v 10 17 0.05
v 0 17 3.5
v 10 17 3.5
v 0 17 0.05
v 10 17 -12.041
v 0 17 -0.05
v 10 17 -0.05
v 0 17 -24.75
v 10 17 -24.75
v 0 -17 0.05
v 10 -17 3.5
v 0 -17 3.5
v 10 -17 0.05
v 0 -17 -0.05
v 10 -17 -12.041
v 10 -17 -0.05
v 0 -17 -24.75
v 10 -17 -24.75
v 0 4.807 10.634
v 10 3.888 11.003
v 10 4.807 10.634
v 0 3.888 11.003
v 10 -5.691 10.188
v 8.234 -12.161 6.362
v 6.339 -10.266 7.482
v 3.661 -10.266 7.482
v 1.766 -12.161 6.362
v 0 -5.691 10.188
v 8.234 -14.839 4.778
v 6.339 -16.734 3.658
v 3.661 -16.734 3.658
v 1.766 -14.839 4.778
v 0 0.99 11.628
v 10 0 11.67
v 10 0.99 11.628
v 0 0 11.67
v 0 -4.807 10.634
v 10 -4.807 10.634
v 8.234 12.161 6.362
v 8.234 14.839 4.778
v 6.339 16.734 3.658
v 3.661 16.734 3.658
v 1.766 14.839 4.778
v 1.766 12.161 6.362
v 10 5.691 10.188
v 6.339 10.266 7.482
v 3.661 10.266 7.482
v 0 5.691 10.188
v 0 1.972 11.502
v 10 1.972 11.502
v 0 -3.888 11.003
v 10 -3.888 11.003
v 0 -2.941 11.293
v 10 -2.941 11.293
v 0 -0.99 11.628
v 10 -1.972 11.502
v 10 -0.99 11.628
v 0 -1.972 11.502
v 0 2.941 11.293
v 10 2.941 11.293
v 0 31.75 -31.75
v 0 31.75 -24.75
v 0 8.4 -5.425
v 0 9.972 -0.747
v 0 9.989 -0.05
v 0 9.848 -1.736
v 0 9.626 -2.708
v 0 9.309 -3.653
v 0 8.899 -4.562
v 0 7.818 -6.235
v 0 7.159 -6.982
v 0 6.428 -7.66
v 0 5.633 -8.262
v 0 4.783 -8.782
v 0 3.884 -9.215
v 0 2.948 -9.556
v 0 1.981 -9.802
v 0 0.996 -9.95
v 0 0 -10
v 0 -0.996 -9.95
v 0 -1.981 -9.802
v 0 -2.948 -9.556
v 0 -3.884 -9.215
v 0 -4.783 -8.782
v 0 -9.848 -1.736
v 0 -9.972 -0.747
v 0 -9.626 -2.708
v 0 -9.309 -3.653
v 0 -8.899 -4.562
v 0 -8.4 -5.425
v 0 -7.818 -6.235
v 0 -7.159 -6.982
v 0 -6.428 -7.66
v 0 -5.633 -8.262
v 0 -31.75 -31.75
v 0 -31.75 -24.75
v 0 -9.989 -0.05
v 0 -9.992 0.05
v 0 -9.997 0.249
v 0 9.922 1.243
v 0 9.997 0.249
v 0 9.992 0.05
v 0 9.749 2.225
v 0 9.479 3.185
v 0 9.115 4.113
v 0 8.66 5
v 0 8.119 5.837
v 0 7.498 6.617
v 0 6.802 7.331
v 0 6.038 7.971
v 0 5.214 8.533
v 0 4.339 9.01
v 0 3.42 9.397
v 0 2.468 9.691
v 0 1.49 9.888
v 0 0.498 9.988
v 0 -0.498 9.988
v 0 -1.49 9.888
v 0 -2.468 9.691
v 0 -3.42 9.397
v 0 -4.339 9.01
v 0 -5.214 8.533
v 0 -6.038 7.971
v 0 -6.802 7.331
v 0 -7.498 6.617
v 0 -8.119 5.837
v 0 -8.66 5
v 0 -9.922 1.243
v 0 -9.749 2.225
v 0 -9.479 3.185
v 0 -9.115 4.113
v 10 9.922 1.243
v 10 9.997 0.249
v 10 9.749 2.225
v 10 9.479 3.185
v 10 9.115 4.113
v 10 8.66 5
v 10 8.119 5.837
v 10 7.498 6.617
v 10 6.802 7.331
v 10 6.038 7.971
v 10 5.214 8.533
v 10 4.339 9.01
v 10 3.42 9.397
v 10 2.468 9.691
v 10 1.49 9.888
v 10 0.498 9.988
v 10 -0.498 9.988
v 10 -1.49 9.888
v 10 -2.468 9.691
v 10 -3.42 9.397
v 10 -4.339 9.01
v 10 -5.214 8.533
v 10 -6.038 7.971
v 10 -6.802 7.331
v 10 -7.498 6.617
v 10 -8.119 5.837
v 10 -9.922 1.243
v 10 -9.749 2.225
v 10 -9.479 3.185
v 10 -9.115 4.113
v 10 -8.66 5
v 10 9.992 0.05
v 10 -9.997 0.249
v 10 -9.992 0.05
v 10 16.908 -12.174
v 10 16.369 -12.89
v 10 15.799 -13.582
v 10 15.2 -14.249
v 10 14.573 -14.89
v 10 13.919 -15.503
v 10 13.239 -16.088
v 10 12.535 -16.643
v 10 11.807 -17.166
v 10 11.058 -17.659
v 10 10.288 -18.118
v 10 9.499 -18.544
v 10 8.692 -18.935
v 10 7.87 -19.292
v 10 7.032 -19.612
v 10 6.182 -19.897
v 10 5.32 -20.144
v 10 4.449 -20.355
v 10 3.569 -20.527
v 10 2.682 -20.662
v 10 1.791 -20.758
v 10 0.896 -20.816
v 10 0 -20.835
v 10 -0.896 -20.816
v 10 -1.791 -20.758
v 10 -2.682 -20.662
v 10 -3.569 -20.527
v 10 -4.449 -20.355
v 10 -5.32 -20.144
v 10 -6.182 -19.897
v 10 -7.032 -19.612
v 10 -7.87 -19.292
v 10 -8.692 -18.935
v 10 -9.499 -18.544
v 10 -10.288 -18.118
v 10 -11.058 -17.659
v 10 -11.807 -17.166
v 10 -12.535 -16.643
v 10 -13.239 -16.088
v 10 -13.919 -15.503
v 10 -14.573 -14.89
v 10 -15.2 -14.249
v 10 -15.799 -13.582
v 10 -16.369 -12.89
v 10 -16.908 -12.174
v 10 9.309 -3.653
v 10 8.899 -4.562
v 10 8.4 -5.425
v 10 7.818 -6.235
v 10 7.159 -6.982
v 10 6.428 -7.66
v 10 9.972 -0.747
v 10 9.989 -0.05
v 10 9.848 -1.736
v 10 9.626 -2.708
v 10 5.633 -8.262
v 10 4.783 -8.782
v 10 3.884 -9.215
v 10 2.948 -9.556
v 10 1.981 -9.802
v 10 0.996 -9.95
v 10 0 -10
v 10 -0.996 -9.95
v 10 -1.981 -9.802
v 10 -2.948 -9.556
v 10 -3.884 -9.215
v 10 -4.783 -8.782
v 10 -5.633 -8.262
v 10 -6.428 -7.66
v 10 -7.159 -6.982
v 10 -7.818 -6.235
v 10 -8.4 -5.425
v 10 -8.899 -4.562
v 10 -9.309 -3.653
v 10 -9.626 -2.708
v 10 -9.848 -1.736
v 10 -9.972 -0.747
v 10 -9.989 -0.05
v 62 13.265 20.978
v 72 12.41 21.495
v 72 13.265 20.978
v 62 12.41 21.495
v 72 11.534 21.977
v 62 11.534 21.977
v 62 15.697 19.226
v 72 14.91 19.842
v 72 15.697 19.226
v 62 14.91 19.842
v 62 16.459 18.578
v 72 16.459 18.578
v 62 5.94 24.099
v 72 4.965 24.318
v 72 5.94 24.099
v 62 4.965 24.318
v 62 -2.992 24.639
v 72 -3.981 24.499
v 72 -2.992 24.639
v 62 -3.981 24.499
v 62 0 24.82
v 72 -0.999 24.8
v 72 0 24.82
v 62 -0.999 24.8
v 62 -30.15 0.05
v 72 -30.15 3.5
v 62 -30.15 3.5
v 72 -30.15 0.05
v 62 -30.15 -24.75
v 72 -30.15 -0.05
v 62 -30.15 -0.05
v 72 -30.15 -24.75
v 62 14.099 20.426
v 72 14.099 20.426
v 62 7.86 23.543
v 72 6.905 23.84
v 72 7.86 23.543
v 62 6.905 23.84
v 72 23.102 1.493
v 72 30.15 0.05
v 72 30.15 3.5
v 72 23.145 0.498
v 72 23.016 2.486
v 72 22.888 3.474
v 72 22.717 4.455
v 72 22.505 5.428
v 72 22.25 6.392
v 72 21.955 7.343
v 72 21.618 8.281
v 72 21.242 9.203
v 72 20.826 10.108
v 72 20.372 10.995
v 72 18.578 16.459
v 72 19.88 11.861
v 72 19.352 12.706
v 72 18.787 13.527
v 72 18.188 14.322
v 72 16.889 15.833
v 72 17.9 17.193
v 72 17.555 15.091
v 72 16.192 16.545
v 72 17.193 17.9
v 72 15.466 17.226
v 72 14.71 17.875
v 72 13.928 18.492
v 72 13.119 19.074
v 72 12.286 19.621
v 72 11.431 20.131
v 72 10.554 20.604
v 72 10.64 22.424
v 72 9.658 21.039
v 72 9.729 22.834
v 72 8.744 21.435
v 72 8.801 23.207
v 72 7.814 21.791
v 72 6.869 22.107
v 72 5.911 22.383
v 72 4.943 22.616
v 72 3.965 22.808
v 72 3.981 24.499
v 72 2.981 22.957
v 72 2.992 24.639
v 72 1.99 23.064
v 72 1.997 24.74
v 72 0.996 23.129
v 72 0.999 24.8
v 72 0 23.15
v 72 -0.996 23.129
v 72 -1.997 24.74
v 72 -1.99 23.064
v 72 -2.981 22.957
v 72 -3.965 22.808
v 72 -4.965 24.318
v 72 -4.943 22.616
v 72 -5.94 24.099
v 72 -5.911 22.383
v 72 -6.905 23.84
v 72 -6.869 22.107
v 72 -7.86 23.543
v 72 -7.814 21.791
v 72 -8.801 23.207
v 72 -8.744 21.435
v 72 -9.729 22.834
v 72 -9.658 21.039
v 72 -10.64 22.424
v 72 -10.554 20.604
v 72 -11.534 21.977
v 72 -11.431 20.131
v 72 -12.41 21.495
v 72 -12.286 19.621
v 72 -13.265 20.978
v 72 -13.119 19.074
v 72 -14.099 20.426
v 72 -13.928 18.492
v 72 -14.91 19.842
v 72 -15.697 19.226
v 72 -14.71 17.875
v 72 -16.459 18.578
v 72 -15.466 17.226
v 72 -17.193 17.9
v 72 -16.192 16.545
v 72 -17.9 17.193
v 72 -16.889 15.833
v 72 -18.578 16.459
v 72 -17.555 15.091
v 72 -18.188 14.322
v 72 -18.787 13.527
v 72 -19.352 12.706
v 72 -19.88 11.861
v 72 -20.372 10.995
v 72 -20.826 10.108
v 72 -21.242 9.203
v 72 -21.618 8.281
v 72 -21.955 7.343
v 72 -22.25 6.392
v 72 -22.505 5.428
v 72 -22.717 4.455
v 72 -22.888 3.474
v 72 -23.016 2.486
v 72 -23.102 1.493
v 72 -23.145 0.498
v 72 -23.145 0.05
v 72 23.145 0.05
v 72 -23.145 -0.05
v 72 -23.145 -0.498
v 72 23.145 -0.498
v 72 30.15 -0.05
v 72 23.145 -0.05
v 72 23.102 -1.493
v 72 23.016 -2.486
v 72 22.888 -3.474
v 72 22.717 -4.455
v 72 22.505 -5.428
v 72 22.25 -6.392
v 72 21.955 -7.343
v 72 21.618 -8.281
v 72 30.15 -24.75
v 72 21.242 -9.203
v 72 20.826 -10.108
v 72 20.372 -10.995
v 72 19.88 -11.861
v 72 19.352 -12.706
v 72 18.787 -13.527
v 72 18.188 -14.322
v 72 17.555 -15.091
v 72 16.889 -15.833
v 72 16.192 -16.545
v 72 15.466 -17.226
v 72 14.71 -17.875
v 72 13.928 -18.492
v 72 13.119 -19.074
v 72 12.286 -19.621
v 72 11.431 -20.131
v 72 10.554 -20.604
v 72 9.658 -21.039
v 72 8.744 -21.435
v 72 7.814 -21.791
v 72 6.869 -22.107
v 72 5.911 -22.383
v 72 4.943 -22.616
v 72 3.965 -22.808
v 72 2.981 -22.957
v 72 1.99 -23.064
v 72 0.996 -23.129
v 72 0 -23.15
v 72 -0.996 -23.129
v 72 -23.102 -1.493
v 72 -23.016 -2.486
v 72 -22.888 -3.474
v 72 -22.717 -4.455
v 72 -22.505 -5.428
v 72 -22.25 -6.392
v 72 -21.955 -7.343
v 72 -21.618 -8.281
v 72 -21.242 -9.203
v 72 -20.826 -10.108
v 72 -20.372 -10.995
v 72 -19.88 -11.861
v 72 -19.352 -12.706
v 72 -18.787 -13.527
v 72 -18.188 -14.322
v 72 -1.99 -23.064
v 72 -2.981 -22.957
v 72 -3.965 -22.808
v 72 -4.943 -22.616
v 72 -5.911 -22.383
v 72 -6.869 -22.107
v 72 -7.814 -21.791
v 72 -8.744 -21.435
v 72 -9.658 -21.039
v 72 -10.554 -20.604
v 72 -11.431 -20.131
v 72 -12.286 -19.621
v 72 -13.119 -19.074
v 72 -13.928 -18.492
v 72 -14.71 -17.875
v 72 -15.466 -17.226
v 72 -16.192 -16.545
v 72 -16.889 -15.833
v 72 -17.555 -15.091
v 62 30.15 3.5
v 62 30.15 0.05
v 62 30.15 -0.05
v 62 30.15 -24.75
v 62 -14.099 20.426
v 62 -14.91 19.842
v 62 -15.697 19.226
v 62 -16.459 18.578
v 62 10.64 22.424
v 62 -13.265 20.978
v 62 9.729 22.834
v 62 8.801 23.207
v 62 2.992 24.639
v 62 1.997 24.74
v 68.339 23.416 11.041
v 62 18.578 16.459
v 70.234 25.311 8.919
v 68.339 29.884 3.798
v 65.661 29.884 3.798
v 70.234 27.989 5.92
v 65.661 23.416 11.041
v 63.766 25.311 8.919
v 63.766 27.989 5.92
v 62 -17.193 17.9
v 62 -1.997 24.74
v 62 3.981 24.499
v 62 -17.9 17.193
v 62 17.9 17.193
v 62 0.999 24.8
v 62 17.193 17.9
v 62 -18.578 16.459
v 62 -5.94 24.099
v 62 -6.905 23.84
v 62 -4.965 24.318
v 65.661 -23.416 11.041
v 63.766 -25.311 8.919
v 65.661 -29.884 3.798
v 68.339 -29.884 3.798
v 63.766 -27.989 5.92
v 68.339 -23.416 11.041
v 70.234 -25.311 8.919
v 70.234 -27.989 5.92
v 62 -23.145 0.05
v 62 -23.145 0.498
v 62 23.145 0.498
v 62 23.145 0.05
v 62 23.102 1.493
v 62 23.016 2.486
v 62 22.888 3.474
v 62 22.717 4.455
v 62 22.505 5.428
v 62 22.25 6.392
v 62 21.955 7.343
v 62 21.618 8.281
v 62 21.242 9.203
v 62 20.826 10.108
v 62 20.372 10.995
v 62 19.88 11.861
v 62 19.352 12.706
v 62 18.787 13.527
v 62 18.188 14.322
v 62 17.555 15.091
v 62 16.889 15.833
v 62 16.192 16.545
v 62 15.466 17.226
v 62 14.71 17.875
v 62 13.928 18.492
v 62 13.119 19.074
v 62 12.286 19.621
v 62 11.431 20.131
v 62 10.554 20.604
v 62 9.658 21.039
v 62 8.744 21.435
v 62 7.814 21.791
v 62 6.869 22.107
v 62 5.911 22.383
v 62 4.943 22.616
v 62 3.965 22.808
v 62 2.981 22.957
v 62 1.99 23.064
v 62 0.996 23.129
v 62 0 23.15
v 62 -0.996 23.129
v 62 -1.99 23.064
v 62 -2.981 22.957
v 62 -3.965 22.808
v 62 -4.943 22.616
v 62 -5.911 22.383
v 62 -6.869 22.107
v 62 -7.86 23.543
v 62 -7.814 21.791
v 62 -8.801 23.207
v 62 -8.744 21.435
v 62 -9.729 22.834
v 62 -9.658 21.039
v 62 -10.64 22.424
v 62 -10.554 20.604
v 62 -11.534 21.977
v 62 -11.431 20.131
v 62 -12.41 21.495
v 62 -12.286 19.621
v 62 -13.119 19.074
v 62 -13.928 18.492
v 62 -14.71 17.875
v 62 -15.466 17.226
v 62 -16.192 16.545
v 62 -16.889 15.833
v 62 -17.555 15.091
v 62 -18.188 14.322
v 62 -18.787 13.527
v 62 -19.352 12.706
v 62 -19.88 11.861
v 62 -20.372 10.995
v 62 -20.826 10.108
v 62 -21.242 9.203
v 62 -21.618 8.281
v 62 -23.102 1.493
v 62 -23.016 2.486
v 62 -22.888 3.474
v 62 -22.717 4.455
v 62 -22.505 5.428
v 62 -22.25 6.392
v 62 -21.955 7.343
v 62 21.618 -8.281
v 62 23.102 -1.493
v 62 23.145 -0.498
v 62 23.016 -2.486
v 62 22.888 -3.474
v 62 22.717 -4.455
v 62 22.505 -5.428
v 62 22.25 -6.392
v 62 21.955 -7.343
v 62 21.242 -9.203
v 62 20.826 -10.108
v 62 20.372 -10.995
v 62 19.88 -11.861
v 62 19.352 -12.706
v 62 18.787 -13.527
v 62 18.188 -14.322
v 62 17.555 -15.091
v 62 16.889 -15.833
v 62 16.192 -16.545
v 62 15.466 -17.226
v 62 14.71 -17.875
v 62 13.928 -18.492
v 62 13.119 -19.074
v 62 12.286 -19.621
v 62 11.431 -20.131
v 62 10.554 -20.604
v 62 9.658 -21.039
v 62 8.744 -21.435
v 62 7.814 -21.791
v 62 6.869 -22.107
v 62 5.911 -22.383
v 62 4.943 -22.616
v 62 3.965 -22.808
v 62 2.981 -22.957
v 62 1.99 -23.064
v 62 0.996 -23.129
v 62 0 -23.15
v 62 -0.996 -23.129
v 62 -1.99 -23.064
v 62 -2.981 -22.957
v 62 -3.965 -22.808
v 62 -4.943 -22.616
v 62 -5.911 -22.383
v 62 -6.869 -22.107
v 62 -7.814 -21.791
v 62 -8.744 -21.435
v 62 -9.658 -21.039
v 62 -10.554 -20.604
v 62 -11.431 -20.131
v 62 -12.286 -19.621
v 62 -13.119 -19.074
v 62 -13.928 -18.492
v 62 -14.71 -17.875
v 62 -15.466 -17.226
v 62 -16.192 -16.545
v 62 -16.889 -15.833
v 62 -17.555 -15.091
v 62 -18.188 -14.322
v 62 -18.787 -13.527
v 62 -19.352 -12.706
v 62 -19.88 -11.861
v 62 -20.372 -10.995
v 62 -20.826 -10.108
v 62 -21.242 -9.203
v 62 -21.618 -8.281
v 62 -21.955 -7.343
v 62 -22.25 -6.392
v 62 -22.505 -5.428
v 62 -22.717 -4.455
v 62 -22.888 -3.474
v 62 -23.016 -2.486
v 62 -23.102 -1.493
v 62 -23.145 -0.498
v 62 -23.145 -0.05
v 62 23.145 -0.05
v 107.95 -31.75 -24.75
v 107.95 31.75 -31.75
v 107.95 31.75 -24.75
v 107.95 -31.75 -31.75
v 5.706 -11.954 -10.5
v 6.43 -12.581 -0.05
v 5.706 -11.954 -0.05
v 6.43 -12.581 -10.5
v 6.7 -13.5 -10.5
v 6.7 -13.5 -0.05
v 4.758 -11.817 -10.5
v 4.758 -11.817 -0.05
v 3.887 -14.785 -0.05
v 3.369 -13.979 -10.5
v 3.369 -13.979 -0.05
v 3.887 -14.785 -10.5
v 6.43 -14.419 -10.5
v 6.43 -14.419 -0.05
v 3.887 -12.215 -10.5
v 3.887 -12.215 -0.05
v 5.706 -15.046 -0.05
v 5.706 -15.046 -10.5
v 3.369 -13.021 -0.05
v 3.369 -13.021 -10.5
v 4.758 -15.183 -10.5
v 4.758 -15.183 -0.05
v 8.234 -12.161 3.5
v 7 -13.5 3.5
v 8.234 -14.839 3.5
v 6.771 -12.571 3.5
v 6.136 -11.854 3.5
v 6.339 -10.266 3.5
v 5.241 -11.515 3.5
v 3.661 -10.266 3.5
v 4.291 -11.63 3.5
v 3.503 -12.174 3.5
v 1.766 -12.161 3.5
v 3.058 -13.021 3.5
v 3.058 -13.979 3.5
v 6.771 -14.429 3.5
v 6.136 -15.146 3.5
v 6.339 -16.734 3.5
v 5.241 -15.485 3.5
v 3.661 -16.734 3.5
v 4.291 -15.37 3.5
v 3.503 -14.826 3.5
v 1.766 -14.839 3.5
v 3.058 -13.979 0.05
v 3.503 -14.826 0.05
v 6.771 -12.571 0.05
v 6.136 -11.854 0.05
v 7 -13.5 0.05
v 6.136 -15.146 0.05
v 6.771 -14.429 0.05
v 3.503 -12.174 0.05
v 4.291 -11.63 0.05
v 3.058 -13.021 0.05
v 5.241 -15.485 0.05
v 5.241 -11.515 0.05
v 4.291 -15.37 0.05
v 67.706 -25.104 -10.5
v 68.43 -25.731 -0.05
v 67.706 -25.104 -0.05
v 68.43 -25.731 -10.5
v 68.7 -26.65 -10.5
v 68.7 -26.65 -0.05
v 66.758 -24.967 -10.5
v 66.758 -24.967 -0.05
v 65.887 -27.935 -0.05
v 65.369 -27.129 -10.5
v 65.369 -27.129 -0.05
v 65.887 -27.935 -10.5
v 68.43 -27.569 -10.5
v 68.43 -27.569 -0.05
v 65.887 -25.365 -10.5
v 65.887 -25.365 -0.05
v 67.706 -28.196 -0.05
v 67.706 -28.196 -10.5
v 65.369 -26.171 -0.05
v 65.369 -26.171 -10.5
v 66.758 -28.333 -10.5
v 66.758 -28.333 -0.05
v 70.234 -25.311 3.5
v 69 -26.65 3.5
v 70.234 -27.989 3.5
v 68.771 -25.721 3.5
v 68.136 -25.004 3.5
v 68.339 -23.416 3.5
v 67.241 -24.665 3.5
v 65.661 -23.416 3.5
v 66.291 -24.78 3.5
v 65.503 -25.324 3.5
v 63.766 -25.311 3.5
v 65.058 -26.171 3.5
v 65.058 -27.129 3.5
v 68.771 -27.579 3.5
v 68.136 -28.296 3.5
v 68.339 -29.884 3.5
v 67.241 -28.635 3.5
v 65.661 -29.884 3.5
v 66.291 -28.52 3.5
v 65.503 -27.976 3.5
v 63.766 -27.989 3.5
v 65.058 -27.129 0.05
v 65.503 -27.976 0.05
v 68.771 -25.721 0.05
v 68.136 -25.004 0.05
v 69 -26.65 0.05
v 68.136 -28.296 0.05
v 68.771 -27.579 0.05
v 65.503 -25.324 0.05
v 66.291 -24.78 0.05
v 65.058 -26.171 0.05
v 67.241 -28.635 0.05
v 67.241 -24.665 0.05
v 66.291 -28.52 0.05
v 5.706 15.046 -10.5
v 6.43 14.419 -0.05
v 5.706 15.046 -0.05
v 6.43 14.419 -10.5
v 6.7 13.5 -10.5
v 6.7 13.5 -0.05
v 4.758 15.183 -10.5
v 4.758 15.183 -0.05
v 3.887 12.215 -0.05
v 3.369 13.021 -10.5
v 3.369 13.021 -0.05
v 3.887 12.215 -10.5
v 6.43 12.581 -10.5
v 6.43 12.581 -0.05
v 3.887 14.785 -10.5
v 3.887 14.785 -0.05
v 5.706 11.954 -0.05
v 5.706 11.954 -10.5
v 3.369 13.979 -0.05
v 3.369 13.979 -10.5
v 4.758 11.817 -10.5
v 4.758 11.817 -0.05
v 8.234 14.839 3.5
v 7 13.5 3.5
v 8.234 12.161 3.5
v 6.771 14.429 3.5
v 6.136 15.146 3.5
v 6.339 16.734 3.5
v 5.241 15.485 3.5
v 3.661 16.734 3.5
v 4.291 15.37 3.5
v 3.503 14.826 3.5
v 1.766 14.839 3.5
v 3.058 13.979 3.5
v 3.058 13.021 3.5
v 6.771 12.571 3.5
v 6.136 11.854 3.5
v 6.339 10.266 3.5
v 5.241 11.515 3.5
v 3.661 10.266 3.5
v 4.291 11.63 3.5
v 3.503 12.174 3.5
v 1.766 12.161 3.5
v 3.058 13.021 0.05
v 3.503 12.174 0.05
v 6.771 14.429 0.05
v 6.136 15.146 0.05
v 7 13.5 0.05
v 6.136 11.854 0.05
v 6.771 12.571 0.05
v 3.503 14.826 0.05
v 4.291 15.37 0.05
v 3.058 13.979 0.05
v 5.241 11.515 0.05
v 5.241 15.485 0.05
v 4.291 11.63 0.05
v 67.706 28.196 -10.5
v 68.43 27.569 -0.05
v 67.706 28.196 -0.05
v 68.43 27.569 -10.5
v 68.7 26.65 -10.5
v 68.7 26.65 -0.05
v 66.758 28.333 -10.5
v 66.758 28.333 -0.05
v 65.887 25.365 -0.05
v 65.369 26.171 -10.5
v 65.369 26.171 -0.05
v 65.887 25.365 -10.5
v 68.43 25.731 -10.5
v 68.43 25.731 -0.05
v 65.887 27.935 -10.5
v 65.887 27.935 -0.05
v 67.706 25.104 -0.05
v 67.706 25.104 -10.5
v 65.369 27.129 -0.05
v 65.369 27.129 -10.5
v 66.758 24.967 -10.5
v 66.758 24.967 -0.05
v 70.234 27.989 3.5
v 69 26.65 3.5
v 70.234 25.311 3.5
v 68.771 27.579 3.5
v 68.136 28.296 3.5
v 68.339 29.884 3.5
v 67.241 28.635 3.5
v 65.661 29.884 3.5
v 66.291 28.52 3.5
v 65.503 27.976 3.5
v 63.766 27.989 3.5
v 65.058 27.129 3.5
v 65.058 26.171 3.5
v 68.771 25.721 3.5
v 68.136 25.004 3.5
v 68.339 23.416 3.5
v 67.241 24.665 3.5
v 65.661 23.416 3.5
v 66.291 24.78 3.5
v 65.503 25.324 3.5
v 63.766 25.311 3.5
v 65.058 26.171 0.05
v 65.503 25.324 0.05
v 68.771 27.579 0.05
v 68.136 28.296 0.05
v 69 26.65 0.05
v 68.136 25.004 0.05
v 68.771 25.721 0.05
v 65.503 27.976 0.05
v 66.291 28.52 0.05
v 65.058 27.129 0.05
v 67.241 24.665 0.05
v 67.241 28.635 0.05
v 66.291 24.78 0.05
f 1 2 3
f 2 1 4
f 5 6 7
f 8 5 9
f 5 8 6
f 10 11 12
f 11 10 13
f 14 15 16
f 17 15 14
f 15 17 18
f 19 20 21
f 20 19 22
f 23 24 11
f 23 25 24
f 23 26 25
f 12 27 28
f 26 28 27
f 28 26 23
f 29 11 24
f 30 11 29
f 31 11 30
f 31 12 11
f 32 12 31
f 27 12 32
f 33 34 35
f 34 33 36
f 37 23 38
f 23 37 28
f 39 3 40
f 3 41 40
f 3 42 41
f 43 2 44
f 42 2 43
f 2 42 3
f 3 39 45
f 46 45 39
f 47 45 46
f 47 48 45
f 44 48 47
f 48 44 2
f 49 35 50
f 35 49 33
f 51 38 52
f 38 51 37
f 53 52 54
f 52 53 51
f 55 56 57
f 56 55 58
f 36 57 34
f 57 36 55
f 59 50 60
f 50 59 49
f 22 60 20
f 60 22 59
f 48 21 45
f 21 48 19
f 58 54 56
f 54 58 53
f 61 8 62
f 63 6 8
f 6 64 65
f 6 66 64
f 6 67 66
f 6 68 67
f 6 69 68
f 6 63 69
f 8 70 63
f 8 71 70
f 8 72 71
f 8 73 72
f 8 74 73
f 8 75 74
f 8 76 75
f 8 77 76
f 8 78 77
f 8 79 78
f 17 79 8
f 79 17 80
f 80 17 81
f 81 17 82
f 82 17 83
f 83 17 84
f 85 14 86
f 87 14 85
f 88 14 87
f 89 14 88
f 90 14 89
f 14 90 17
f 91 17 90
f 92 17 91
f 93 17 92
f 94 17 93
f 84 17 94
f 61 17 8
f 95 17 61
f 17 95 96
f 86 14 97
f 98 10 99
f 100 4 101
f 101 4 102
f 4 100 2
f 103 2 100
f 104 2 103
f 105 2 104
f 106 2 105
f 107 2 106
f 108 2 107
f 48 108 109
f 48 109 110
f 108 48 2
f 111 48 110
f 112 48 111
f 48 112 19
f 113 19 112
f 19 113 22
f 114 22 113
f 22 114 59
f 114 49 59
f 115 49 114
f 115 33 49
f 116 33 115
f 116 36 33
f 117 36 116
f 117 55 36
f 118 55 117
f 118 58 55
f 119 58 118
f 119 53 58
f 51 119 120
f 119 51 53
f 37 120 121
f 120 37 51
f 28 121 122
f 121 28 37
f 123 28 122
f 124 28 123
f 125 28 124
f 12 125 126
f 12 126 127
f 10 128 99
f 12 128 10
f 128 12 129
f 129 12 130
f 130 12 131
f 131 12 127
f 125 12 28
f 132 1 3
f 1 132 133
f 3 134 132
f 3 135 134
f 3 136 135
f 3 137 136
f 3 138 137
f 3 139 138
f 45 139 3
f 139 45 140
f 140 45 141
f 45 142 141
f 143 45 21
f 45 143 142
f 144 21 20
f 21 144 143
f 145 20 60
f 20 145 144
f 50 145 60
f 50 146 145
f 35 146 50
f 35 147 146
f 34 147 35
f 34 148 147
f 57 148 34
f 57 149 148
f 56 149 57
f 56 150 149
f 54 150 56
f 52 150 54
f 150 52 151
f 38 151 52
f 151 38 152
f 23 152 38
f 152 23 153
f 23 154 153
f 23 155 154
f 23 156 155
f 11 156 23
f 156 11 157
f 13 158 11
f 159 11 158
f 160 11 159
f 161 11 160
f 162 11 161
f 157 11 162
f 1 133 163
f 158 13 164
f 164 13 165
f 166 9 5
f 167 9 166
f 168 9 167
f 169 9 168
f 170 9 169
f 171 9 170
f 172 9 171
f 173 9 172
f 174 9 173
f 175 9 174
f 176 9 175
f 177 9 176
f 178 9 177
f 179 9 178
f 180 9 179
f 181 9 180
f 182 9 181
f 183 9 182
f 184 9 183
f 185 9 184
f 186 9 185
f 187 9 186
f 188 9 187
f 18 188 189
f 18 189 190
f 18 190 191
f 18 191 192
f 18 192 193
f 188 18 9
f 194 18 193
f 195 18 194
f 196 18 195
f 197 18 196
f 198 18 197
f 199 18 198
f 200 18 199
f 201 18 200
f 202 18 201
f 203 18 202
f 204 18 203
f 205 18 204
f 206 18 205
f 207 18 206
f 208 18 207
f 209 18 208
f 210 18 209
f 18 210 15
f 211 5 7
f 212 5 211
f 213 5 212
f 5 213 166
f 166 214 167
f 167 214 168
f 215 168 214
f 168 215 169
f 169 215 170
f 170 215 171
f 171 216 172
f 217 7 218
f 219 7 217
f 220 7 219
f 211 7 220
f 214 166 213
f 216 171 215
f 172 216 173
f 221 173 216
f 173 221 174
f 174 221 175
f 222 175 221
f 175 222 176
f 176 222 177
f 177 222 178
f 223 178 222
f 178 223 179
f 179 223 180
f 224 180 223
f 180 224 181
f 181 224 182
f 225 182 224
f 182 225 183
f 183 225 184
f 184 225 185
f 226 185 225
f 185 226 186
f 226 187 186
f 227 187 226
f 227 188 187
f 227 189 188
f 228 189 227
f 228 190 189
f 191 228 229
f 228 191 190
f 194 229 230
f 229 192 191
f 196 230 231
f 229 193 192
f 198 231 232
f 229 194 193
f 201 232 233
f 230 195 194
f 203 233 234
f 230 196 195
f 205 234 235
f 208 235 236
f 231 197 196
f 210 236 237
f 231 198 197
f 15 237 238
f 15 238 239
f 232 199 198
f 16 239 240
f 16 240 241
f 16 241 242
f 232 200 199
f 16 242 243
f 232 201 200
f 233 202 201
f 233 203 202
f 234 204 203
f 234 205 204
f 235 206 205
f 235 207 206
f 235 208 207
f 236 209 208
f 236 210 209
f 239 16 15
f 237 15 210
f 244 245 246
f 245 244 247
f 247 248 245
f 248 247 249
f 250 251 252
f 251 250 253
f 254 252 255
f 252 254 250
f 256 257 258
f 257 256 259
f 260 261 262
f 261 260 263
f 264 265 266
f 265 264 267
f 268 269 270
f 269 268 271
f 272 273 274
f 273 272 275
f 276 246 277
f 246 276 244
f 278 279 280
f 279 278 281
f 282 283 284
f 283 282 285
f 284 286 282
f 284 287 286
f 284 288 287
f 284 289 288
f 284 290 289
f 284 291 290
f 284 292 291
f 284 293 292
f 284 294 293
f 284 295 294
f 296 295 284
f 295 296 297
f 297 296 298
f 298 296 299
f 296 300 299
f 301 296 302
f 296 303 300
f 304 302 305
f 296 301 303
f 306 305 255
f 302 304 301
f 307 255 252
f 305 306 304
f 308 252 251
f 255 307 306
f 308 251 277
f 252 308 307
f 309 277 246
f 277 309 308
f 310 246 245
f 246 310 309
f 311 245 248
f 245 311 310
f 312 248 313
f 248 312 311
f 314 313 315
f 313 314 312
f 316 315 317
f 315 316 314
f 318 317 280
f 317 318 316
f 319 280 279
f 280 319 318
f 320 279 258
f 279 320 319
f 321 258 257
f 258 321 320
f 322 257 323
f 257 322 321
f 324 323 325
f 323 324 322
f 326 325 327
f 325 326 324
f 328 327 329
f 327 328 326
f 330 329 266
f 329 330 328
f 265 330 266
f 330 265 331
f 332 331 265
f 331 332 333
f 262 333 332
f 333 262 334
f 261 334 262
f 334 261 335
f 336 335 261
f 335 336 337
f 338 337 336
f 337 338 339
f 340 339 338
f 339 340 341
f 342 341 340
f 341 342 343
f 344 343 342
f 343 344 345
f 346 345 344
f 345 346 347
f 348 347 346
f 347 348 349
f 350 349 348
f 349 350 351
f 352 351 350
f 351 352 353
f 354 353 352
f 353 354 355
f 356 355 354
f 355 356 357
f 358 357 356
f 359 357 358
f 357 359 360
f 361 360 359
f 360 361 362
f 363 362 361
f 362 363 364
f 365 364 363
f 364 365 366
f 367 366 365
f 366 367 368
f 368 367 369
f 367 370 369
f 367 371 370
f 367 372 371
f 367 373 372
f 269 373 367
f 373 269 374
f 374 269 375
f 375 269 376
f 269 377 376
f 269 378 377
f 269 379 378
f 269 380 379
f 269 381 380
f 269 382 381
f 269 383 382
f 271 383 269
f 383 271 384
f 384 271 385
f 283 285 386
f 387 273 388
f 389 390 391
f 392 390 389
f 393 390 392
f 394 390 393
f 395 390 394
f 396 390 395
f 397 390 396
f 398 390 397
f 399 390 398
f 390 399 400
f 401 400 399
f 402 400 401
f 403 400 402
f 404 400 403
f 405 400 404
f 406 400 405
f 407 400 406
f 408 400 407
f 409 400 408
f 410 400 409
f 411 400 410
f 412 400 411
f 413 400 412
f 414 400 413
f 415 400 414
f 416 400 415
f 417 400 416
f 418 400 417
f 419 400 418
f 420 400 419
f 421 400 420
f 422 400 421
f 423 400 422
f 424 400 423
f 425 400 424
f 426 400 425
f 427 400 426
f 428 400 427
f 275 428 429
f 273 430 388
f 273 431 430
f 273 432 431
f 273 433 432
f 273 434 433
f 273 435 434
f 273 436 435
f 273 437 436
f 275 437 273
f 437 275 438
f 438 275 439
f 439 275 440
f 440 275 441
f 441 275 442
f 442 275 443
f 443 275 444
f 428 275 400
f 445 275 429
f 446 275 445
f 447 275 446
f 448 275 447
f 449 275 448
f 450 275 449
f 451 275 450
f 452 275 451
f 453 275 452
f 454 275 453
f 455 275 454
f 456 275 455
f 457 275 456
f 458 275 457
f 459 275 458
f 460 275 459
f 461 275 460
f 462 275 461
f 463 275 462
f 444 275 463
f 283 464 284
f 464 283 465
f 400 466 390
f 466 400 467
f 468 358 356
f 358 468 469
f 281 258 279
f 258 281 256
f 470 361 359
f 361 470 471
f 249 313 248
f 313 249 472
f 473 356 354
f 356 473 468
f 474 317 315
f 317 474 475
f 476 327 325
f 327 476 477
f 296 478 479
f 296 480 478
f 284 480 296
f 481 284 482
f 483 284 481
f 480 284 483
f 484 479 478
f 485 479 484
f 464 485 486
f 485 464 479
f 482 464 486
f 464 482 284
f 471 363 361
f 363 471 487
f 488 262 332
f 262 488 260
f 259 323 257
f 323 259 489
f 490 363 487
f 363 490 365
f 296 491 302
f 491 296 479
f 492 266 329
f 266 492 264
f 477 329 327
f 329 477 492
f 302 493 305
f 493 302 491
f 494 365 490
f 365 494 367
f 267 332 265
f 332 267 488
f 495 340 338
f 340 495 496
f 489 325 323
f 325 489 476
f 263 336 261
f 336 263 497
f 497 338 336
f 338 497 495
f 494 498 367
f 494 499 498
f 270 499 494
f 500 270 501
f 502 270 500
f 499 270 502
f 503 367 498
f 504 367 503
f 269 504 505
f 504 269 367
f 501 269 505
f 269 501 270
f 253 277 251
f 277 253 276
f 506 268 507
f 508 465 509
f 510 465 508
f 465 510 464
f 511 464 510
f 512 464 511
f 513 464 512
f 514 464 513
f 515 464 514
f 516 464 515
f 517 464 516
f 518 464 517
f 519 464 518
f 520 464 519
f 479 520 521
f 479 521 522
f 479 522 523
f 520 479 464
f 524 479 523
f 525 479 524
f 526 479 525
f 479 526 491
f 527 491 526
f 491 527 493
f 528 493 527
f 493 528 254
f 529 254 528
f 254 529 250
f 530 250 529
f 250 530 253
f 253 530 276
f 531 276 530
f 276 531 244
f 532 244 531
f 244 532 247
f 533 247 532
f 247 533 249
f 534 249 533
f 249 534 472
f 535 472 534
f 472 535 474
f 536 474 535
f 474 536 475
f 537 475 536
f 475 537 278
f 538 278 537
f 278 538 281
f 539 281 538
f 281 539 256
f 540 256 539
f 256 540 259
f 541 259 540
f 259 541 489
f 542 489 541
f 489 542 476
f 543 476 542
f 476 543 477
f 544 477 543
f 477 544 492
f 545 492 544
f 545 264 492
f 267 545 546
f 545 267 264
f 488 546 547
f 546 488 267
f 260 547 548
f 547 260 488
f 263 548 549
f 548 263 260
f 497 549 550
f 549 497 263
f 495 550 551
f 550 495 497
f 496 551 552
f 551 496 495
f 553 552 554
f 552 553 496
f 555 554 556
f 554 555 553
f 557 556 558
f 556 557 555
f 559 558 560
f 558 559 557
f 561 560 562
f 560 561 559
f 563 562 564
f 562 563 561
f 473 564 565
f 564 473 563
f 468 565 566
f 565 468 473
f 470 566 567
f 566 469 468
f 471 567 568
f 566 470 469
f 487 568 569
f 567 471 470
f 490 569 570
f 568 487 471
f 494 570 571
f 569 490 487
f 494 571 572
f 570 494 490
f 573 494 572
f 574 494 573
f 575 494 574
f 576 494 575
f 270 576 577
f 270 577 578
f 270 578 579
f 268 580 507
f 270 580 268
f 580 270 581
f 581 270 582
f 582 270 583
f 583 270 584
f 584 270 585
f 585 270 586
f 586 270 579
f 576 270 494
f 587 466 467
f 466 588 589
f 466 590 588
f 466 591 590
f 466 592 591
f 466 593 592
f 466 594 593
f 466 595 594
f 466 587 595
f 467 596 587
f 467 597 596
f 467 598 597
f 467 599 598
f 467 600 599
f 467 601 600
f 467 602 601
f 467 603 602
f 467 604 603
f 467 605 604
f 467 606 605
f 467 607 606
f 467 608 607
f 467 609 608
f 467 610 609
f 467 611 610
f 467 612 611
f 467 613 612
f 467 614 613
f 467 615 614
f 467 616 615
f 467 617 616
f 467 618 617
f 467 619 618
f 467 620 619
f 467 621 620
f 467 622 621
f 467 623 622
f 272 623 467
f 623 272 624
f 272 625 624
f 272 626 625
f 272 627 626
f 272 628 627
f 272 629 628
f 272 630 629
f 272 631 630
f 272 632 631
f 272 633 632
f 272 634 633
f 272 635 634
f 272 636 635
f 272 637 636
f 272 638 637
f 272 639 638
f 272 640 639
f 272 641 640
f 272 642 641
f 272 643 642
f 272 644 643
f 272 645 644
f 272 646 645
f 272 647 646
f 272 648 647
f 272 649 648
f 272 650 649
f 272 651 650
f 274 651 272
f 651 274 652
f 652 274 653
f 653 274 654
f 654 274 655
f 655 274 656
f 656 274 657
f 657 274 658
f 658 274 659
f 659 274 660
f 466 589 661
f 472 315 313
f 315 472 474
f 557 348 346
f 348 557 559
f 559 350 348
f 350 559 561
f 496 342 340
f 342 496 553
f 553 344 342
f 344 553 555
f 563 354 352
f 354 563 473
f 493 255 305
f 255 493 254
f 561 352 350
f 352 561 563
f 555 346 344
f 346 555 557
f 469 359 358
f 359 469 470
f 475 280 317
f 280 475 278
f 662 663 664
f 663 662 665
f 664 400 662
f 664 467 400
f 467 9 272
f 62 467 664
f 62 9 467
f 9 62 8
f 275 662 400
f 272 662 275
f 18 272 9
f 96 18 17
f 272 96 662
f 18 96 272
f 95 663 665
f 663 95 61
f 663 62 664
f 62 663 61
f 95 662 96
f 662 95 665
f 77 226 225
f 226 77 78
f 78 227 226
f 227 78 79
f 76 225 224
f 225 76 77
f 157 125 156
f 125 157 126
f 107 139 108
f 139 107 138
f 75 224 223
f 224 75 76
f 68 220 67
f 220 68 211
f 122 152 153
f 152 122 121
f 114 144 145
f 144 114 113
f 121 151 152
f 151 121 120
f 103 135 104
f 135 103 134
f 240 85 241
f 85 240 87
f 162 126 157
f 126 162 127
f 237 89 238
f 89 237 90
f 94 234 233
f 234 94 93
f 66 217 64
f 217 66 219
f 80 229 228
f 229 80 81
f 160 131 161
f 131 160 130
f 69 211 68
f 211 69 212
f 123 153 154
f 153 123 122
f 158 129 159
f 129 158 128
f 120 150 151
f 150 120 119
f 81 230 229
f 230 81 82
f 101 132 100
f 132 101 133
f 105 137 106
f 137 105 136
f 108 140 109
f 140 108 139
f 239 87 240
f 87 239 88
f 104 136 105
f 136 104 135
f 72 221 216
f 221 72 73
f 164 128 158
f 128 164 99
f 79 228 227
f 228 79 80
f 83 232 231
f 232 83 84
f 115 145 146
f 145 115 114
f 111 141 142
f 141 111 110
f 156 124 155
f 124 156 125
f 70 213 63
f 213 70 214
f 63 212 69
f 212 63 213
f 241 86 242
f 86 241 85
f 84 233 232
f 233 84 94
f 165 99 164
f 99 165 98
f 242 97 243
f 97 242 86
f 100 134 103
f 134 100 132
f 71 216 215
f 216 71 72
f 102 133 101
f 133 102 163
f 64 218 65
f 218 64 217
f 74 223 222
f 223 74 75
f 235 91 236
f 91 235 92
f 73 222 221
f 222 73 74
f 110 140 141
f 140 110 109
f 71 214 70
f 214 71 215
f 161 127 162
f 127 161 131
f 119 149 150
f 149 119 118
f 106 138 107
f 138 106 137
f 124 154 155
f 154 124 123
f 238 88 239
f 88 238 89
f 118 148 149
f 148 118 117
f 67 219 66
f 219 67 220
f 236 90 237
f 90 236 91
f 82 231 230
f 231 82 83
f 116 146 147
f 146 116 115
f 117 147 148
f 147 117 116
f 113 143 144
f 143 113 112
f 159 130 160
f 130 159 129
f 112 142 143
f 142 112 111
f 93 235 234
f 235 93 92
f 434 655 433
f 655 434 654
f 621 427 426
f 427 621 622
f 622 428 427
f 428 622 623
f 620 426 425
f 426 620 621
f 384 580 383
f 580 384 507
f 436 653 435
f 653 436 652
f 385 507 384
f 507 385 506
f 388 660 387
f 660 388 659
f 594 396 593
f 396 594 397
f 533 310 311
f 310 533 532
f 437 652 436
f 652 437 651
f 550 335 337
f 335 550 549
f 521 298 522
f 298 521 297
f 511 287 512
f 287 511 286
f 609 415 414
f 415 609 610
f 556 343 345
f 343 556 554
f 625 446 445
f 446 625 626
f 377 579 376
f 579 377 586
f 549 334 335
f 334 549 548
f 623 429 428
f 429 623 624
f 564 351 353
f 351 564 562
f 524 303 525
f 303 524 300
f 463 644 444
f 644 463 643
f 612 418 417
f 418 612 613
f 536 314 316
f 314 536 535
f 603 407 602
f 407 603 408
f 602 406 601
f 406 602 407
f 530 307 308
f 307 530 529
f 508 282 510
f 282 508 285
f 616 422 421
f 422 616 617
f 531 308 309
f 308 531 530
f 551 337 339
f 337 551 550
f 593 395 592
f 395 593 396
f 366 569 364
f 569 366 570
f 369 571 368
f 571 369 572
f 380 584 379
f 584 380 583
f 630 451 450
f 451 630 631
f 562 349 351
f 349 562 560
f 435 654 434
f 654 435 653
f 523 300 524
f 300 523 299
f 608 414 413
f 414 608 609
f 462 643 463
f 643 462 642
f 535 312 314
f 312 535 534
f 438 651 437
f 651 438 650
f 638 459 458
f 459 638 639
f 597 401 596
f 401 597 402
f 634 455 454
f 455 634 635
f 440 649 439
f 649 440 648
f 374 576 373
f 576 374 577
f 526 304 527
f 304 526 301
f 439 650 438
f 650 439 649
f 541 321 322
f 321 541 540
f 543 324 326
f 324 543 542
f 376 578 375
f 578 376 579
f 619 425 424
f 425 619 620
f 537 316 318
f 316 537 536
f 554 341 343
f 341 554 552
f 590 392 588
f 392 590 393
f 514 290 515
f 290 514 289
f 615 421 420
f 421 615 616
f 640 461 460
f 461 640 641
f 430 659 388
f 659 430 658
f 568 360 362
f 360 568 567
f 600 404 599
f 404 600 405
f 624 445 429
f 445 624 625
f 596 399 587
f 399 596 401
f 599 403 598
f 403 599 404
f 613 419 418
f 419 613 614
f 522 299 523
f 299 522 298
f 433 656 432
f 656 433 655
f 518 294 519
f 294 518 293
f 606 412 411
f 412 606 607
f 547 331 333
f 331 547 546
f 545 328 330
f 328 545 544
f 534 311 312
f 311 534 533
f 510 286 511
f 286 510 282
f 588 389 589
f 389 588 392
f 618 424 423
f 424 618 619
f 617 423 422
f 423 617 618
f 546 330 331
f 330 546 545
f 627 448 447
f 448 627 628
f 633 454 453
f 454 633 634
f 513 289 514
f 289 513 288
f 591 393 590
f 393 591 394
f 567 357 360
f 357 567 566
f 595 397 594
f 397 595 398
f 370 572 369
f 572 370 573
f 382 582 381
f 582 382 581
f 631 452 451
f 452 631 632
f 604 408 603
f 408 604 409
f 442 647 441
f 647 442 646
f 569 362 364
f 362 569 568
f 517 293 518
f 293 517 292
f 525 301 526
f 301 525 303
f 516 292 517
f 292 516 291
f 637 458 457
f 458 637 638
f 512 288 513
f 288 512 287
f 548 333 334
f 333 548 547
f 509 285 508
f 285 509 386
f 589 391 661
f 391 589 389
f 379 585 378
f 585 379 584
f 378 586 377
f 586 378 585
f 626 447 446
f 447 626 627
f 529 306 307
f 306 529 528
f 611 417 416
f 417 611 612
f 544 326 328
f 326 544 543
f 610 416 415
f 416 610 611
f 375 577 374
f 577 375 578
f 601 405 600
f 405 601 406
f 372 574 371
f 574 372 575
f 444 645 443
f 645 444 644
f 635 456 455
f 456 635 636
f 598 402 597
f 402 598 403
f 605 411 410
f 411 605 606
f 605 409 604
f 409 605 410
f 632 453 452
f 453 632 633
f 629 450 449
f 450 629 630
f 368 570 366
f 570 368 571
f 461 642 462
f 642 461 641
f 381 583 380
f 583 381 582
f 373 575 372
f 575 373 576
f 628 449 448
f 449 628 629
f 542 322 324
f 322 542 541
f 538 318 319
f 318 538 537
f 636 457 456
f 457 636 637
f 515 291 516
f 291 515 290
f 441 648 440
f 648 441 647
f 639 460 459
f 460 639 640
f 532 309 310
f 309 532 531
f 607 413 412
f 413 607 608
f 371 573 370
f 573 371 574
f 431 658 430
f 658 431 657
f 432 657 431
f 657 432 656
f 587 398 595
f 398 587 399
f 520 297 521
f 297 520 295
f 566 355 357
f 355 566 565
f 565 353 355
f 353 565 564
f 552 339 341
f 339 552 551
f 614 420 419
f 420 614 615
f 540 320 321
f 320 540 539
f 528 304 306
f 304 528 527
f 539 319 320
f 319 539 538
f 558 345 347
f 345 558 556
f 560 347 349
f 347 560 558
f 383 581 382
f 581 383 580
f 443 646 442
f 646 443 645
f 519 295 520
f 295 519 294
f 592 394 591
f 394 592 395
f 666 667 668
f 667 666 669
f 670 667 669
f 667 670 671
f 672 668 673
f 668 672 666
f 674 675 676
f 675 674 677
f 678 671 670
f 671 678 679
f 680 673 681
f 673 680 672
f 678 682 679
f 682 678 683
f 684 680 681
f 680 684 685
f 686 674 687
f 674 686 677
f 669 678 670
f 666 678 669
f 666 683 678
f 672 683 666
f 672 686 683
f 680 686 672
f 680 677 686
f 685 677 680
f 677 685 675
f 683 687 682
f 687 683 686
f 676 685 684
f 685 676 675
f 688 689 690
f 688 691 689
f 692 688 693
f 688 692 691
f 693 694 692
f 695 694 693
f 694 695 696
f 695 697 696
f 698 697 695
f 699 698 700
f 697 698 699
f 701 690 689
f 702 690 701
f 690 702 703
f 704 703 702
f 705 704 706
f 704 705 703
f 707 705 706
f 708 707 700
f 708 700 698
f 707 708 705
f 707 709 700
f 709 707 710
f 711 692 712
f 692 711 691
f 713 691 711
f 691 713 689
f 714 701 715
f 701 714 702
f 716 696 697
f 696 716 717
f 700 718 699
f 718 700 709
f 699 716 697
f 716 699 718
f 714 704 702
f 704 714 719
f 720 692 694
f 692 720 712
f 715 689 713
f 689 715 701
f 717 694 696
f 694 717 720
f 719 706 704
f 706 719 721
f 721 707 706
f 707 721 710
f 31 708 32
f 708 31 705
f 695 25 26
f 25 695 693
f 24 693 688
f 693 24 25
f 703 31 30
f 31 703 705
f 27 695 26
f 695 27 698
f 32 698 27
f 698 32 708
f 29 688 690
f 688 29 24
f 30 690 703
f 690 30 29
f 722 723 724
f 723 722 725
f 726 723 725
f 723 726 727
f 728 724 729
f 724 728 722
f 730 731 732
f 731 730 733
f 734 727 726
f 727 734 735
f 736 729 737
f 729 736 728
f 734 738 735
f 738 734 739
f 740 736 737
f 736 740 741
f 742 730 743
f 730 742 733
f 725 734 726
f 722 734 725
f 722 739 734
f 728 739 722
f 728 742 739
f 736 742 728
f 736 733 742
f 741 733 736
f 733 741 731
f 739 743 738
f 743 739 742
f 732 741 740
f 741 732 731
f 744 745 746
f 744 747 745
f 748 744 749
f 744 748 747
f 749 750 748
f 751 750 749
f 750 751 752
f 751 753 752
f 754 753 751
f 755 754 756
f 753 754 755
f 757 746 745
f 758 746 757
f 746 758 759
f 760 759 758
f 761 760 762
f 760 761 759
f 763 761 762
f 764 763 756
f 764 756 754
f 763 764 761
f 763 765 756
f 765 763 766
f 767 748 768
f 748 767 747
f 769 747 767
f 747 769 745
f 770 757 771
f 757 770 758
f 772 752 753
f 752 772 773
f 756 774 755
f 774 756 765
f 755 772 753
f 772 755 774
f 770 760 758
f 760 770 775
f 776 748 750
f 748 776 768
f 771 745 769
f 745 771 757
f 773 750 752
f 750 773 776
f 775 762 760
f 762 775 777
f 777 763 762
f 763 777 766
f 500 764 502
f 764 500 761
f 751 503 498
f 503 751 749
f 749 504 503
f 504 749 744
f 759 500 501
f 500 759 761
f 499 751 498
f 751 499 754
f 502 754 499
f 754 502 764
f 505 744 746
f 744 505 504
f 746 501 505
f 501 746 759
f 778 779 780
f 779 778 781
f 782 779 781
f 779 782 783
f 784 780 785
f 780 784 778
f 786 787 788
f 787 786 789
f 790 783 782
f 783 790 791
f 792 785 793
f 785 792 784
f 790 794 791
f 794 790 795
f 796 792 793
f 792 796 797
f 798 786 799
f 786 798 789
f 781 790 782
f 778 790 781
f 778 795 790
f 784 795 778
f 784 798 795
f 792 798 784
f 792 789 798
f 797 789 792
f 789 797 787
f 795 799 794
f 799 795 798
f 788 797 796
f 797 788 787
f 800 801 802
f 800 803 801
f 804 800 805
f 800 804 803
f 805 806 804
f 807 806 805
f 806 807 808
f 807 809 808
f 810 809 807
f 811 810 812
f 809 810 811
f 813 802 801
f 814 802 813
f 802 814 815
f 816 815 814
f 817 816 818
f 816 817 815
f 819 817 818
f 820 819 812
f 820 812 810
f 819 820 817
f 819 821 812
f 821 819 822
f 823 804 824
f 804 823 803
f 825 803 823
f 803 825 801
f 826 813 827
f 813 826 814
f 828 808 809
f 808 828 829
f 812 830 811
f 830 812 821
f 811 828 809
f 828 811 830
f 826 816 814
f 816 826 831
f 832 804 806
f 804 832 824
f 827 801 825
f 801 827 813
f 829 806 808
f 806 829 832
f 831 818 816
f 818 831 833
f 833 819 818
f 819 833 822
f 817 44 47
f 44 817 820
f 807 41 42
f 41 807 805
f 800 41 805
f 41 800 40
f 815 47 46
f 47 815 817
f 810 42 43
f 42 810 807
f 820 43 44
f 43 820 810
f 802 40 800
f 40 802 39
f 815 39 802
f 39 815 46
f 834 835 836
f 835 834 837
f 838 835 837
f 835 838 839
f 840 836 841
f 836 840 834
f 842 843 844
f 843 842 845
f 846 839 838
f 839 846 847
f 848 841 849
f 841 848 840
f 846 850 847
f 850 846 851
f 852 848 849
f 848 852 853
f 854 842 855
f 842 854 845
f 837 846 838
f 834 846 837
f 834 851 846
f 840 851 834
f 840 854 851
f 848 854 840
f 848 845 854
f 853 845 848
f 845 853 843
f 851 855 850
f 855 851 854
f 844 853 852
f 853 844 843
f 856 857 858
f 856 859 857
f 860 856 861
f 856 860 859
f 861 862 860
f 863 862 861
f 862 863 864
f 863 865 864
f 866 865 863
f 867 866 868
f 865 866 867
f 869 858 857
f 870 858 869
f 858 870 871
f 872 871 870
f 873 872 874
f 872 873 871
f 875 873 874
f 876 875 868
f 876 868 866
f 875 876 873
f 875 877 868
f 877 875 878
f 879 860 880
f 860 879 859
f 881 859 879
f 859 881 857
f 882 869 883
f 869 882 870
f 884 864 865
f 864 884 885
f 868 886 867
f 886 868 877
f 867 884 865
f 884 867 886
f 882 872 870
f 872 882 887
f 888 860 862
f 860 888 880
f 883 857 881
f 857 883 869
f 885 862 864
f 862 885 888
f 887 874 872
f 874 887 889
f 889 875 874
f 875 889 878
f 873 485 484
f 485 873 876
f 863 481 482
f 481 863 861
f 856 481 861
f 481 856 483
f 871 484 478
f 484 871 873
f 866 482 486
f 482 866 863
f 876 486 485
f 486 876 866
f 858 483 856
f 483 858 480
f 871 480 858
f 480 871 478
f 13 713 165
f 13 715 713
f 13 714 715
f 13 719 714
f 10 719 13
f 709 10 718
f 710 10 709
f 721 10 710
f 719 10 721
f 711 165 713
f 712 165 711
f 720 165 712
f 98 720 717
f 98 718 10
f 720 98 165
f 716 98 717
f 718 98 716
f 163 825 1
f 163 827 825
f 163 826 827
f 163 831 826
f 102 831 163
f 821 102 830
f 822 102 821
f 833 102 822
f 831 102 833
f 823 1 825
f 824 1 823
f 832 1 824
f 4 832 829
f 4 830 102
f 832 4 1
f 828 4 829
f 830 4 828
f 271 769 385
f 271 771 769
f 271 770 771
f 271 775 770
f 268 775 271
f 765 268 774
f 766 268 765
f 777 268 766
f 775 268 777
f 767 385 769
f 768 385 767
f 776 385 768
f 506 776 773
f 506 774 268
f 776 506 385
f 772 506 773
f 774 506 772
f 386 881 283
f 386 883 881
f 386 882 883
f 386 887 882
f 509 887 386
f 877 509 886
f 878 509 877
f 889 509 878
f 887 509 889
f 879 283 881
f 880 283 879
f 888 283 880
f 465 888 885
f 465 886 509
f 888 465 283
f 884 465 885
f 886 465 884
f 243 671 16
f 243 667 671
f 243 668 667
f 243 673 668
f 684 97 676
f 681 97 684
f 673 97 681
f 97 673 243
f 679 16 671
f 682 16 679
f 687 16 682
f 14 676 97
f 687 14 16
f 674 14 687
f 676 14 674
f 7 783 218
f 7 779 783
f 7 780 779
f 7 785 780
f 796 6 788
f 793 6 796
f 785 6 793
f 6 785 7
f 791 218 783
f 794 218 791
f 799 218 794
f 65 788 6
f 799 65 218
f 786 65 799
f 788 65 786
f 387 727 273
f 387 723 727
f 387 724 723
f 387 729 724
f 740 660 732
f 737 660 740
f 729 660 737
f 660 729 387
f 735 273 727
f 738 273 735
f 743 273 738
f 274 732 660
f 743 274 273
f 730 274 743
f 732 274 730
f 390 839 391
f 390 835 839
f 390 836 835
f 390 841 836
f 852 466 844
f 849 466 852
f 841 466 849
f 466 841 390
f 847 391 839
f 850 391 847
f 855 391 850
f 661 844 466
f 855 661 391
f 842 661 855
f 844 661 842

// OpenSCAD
$fa = .01;
$fs = $preview ? 1 : 1;

inch = 25.4;

d_threads = 20;
w_threads = 10;
offset_body = 52;
d_body = 46.3;
unit = inch/4;
h_body = 30;

twt=1.67;

d_screw = 3.4;
d_screw_hole = 4;
d_screw_head = 7;
l_screw = 14;
h_nut=3.1;
d_nut=7;

ratio=.75;

clamp_thickness = 7;

function round_to(x, y=1) = ceil(x/y)*y;


module dremel_prev() rotate([0,90,0]){
    translate([0,0,-.1])cylinder(d=d_threads, h=w_threads+.2);
    translate([0,0,w_threads]) cylinder(d1=d_threads,d2=d_body,h=offset_body-w_threads);
    translate([0,0,offset_body-.1]) cylinder(d=d_body,h=h_body+.2);
}
module dremel() rotate([0,90,0]){
    translate([0,0,-.1])cylinder(d=d_threads, h=w_threads+.2);
    translate([0,0,w_threads]) cylinder(d1=d_body*.9,d2=d_body,h=offset_body-w_threads);
    translate([0,0,offset_body-.1]) cylinder(d=d_body,h=99);
}

module screw_hole(){
    translate([0,0,-ratio*l_screw]) cylinder(d=d_screw,h=l_screw); //threaded part
    cylinder(d=d_screw_hole,h=l_screw); //floating part
    translate([0,0,l_screw*(1-ratio)]) rotate([0,0,360/16])cylinder(d=d_screw_head,h=99, $fn=8); //room for head
}
difference(){
    h_centerline=round_to(d_body/2+clamp_thickness, unit);
    union(){
        hull(){
            rotate([0,90,0]) cylinder(d=d_threads+2*twt,h=w_threads);
            translate([0,-(d_threads+2*clamp_thickness)/2,(1-ratio)*l_screw-h_centerline]) cube([w_threads, d_threads+2*clamp_thickness,h_centerline]);
        }

        hull(){
            offset_body = offset_body + h_body/3;
            h_body = h_body/3;
            rotate([0,90,0]) translate([0,0,offset_body]) cylinder(d=d_body+2*twt,h=h_body);
            translate([offset_body,-(d_body+2*clamp_thickness)/2,(1-ratio)*l_screw-h_centerline]) cube([h_body, d_body+2*clamp_thickness, h_centerline]);
        }


        w_base = round_to(d_body+2*clamp_thickness, unit*2);
        l_base = round_to((offset_body+h_body)*1.25, unit);
        echo("final base size", w_base/unit, l_base/unit);
        translate([0,-w_base/2,-h_centerline]) cube([l_base, w_base, clamp_thickness]);
    }
    dremel();
    for(flip=[-1,1]){
        translate([w_threads/2,flip*(d_threads+clamp_thickness)/2]) screw_hole();
        translate([offset_body + h_body/2,flip*(d_body+clamp_thickness)/2]) screw_hole();
    }

    cube([999,999,.1], center=true);
}

%dremel_prev();
